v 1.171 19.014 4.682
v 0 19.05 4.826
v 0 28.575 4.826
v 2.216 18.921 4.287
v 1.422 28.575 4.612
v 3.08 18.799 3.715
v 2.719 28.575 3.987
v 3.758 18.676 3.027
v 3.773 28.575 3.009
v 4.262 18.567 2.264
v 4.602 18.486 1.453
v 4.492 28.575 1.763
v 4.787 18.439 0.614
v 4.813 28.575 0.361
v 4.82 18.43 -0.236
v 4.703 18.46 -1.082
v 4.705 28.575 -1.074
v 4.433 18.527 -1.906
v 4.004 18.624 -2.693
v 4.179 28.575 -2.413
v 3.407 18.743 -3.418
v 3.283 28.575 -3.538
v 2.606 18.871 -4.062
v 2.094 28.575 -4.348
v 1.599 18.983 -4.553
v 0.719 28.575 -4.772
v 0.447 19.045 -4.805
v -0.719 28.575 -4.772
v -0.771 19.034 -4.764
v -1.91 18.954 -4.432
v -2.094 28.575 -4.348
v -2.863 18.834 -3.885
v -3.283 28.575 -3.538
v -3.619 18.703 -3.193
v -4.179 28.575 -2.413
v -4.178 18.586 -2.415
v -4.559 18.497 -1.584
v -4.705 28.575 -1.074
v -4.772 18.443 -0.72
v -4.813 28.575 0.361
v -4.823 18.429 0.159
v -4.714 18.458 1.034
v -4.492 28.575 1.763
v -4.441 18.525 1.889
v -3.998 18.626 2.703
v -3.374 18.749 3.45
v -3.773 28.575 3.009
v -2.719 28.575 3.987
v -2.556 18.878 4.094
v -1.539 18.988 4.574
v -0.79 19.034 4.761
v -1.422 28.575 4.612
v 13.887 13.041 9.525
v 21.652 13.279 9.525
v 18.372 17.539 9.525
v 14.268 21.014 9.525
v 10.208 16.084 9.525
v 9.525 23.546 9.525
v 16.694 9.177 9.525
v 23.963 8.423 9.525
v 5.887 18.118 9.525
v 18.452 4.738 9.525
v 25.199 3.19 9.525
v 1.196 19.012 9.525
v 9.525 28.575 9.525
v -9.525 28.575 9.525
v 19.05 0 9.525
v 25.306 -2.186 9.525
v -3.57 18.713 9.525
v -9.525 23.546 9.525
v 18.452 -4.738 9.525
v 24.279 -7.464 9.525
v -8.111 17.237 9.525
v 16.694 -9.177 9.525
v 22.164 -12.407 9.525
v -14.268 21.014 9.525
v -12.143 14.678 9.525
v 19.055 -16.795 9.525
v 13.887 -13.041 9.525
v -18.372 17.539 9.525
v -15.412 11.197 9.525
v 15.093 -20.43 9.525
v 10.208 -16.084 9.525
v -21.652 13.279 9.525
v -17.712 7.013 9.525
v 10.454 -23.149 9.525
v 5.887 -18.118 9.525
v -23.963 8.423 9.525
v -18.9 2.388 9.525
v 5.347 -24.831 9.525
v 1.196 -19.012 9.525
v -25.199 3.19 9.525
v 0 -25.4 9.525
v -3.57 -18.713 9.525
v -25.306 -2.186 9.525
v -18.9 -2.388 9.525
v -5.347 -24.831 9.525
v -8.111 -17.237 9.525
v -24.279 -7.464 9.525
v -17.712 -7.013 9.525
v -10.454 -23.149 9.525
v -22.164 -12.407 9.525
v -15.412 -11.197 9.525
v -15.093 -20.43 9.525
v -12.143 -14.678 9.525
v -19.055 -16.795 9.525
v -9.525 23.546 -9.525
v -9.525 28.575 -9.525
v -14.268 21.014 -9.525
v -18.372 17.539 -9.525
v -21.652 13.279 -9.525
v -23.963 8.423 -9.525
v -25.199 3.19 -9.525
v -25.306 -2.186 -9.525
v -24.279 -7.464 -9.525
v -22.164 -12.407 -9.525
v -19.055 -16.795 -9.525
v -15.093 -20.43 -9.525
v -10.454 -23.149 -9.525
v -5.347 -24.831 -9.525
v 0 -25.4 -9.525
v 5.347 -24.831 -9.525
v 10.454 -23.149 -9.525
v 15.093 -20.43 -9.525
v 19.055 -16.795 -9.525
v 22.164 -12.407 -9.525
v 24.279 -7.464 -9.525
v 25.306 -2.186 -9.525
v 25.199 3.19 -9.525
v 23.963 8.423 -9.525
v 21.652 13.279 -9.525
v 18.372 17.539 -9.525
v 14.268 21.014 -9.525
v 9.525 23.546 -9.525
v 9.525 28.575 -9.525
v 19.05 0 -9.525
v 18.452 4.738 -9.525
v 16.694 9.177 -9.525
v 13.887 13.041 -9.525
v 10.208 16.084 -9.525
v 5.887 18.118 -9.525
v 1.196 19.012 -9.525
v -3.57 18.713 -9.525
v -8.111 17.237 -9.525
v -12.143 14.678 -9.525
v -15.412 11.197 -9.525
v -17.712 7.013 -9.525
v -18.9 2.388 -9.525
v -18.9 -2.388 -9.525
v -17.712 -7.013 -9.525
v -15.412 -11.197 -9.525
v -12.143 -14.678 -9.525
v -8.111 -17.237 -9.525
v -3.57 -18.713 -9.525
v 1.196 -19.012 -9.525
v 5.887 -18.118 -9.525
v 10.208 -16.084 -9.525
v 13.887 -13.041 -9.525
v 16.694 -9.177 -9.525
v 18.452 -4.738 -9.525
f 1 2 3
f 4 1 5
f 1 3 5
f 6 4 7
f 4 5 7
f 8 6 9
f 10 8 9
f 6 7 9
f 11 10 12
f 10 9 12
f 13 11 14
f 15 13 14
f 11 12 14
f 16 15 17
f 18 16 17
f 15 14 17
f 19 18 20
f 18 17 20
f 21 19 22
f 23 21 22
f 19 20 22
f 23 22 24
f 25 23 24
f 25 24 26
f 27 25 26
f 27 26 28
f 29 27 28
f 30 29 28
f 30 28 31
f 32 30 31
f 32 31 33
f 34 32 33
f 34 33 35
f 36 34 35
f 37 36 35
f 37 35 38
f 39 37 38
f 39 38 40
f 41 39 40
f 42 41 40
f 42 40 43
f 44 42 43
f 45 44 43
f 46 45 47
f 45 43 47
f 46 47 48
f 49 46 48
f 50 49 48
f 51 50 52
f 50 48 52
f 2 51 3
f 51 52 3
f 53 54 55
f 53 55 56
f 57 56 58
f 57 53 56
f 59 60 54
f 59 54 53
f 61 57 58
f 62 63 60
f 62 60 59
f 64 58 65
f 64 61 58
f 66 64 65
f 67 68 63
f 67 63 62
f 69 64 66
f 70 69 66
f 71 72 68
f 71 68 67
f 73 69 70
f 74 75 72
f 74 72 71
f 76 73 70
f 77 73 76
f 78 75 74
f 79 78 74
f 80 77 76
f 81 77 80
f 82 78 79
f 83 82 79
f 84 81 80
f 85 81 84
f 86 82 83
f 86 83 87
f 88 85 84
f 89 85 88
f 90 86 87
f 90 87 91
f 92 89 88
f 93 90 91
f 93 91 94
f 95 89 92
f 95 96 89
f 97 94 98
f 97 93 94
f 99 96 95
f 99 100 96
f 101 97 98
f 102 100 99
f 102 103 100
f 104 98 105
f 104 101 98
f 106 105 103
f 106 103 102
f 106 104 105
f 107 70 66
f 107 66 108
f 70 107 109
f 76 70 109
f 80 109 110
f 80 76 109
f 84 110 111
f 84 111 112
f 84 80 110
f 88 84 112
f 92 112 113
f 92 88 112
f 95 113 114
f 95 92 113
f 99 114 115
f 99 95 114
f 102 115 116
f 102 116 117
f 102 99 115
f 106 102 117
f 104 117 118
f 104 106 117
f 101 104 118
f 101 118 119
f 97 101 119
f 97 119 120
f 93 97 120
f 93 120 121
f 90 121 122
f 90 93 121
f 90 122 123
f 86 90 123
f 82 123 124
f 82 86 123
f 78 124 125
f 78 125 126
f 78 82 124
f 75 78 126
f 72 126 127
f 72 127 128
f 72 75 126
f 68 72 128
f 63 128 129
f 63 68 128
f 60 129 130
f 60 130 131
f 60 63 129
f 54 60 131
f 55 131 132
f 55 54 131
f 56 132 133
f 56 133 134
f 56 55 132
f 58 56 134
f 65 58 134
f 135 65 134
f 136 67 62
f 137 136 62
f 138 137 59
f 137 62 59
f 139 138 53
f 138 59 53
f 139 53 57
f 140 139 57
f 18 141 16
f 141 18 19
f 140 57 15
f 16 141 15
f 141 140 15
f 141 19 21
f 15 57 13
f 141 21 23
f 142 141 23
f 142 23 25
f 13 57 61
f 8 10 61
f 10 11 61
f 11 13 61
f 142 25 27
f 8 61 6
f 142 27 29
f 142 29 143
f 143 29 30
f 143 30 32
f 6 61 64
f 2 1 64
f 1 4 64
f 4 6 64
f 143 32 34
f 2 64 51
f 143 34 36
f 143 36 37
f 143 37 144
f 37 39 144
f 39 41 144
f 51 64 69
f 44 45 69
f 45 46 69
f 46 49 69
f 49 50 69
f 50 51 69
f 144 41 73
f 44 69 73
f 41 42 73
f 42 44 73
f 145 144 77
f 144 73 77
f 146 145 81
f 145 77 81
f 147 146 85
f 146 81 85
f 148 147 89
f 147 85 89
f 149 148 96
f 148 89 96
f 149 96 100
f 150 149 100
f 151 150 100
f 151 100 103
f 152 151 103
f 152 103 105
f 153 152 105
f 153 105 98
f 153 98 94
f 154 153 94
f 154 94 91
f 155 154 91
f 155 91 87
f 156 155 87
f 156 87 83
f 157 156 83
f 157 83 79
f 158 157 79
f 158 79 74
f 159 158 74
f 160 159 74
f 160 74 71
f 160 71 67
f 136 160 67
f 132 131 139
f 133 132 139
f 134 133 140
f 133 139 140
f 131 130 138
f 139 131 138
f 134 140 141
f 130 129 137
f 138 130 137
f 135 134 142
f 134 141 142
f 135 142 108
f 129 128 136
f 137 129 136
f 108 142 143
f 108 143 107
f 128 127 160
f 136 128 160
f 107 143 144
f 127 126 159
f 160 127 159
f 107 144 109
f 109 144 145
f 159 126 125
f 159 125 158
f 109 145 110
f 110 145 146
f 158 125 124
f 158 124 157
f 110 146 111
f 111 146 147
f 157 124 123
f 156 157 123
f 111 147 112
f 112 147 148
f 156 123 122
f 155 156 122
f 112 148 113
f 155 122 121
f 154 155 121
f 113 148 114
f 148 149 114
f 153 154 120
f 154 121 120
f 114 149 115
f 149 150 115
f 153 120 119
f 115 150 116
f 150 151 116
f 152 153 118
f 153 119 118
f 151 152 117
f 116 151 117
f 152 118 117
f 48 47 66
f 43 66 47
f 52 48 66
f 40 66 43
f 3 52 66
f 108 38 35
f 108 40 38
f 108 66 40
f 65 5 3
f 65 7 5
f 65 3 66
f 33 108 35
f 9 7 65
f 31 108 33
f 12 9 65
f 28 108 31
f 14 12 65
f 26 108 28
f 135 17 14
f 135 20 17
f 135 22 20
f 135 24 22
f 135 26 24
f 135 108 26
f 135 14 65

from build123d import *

# Parameters (mm, degrees)
SKETCH1_R               = 25.4
BOSS_EXTRUDE1_DEPTH     = 9.525
SKETCH2_W               = 19.05
SKETCH2_H               = 19.05
BOSS_EXTRUDE2_DEPTH     = 28.575
SKETCH3_R               = 19.05
CUT_EXTRUDE1_DEPTH      = 43.715256349
CUT_EXTRUDE2_REACH      = 62.408
CUT_EXTRUDE2_END_RADIUS = 19.05
SKETCH4_R               = 4.826


with BuildPart() as part:
    # Sketch1 → Boss-Extrude1 (new, symmetric)
    with BuildSketch(Plane.XY):
        with Locations(Location((0, 0, 0), (0, 0, 180))):
            Circle(SKETCH1_R)
    extrude(amount=BOSS_EXTRUDE1_DEPTH, both=True)

    # Sketch2 → Boss-Extrude2 (add)
    with BuildSketch(Plane(origin=(0, 0, 0), x_dir=(1, 0, 0), z_dir=(0, 1, 0))):
        Rectangle(SKETCH2_W, SKETCH2_H)
    extrude(amount=BOSS_EXTRUDE2_DEPTH)

    # Sketch3 → Cut-Extrude1 (cut, through all)
    with BuildSketch(Plane.XY.offset(9.525)):
        Circle(SKETCH3_R)
    extrude(amount=-CUT_EXTRUDE1_DEPTH, mode=Mode.SUBTRACT)

    # Cut-Extrude2: up to this cylinder (the profile starts outside it)
    cut_extrude2_end = Plane(origin=(0, 0, 0), z_dir=(0, 0, 1)) * Cylinder(CUT_EXTRUDE2_END_RADIUS, 163.916, mode=Mode.PRIVATE)
    # Sketch4 → Cut-Extrude2 (cut, up to the surface)
    with BuildSketch(Plane(origin=(0, 28.575, 0), x_dir=(1, 0, 0), z_dir=(0, 1, 0)), mode=Mode.PRIVATE) as cut_extrude2_sk1:
        with Locations(Location((0, 0, 0), (0, 0, 270))):
            Circle(SKETCH4_R)
    cut_extrude2_tool1 = extrude(cut_extrude2_sk1.sketch, amount=-CUT_EXTRUDE2_REACH, mode=Mode.PRIVATE) - cut_extrude2_end
    add(cut_extrude2_tool1.solids().sort_by_distance((0, 28.575, 0))[0], mode=Mode.SUBTRACT)


solid = part.part
